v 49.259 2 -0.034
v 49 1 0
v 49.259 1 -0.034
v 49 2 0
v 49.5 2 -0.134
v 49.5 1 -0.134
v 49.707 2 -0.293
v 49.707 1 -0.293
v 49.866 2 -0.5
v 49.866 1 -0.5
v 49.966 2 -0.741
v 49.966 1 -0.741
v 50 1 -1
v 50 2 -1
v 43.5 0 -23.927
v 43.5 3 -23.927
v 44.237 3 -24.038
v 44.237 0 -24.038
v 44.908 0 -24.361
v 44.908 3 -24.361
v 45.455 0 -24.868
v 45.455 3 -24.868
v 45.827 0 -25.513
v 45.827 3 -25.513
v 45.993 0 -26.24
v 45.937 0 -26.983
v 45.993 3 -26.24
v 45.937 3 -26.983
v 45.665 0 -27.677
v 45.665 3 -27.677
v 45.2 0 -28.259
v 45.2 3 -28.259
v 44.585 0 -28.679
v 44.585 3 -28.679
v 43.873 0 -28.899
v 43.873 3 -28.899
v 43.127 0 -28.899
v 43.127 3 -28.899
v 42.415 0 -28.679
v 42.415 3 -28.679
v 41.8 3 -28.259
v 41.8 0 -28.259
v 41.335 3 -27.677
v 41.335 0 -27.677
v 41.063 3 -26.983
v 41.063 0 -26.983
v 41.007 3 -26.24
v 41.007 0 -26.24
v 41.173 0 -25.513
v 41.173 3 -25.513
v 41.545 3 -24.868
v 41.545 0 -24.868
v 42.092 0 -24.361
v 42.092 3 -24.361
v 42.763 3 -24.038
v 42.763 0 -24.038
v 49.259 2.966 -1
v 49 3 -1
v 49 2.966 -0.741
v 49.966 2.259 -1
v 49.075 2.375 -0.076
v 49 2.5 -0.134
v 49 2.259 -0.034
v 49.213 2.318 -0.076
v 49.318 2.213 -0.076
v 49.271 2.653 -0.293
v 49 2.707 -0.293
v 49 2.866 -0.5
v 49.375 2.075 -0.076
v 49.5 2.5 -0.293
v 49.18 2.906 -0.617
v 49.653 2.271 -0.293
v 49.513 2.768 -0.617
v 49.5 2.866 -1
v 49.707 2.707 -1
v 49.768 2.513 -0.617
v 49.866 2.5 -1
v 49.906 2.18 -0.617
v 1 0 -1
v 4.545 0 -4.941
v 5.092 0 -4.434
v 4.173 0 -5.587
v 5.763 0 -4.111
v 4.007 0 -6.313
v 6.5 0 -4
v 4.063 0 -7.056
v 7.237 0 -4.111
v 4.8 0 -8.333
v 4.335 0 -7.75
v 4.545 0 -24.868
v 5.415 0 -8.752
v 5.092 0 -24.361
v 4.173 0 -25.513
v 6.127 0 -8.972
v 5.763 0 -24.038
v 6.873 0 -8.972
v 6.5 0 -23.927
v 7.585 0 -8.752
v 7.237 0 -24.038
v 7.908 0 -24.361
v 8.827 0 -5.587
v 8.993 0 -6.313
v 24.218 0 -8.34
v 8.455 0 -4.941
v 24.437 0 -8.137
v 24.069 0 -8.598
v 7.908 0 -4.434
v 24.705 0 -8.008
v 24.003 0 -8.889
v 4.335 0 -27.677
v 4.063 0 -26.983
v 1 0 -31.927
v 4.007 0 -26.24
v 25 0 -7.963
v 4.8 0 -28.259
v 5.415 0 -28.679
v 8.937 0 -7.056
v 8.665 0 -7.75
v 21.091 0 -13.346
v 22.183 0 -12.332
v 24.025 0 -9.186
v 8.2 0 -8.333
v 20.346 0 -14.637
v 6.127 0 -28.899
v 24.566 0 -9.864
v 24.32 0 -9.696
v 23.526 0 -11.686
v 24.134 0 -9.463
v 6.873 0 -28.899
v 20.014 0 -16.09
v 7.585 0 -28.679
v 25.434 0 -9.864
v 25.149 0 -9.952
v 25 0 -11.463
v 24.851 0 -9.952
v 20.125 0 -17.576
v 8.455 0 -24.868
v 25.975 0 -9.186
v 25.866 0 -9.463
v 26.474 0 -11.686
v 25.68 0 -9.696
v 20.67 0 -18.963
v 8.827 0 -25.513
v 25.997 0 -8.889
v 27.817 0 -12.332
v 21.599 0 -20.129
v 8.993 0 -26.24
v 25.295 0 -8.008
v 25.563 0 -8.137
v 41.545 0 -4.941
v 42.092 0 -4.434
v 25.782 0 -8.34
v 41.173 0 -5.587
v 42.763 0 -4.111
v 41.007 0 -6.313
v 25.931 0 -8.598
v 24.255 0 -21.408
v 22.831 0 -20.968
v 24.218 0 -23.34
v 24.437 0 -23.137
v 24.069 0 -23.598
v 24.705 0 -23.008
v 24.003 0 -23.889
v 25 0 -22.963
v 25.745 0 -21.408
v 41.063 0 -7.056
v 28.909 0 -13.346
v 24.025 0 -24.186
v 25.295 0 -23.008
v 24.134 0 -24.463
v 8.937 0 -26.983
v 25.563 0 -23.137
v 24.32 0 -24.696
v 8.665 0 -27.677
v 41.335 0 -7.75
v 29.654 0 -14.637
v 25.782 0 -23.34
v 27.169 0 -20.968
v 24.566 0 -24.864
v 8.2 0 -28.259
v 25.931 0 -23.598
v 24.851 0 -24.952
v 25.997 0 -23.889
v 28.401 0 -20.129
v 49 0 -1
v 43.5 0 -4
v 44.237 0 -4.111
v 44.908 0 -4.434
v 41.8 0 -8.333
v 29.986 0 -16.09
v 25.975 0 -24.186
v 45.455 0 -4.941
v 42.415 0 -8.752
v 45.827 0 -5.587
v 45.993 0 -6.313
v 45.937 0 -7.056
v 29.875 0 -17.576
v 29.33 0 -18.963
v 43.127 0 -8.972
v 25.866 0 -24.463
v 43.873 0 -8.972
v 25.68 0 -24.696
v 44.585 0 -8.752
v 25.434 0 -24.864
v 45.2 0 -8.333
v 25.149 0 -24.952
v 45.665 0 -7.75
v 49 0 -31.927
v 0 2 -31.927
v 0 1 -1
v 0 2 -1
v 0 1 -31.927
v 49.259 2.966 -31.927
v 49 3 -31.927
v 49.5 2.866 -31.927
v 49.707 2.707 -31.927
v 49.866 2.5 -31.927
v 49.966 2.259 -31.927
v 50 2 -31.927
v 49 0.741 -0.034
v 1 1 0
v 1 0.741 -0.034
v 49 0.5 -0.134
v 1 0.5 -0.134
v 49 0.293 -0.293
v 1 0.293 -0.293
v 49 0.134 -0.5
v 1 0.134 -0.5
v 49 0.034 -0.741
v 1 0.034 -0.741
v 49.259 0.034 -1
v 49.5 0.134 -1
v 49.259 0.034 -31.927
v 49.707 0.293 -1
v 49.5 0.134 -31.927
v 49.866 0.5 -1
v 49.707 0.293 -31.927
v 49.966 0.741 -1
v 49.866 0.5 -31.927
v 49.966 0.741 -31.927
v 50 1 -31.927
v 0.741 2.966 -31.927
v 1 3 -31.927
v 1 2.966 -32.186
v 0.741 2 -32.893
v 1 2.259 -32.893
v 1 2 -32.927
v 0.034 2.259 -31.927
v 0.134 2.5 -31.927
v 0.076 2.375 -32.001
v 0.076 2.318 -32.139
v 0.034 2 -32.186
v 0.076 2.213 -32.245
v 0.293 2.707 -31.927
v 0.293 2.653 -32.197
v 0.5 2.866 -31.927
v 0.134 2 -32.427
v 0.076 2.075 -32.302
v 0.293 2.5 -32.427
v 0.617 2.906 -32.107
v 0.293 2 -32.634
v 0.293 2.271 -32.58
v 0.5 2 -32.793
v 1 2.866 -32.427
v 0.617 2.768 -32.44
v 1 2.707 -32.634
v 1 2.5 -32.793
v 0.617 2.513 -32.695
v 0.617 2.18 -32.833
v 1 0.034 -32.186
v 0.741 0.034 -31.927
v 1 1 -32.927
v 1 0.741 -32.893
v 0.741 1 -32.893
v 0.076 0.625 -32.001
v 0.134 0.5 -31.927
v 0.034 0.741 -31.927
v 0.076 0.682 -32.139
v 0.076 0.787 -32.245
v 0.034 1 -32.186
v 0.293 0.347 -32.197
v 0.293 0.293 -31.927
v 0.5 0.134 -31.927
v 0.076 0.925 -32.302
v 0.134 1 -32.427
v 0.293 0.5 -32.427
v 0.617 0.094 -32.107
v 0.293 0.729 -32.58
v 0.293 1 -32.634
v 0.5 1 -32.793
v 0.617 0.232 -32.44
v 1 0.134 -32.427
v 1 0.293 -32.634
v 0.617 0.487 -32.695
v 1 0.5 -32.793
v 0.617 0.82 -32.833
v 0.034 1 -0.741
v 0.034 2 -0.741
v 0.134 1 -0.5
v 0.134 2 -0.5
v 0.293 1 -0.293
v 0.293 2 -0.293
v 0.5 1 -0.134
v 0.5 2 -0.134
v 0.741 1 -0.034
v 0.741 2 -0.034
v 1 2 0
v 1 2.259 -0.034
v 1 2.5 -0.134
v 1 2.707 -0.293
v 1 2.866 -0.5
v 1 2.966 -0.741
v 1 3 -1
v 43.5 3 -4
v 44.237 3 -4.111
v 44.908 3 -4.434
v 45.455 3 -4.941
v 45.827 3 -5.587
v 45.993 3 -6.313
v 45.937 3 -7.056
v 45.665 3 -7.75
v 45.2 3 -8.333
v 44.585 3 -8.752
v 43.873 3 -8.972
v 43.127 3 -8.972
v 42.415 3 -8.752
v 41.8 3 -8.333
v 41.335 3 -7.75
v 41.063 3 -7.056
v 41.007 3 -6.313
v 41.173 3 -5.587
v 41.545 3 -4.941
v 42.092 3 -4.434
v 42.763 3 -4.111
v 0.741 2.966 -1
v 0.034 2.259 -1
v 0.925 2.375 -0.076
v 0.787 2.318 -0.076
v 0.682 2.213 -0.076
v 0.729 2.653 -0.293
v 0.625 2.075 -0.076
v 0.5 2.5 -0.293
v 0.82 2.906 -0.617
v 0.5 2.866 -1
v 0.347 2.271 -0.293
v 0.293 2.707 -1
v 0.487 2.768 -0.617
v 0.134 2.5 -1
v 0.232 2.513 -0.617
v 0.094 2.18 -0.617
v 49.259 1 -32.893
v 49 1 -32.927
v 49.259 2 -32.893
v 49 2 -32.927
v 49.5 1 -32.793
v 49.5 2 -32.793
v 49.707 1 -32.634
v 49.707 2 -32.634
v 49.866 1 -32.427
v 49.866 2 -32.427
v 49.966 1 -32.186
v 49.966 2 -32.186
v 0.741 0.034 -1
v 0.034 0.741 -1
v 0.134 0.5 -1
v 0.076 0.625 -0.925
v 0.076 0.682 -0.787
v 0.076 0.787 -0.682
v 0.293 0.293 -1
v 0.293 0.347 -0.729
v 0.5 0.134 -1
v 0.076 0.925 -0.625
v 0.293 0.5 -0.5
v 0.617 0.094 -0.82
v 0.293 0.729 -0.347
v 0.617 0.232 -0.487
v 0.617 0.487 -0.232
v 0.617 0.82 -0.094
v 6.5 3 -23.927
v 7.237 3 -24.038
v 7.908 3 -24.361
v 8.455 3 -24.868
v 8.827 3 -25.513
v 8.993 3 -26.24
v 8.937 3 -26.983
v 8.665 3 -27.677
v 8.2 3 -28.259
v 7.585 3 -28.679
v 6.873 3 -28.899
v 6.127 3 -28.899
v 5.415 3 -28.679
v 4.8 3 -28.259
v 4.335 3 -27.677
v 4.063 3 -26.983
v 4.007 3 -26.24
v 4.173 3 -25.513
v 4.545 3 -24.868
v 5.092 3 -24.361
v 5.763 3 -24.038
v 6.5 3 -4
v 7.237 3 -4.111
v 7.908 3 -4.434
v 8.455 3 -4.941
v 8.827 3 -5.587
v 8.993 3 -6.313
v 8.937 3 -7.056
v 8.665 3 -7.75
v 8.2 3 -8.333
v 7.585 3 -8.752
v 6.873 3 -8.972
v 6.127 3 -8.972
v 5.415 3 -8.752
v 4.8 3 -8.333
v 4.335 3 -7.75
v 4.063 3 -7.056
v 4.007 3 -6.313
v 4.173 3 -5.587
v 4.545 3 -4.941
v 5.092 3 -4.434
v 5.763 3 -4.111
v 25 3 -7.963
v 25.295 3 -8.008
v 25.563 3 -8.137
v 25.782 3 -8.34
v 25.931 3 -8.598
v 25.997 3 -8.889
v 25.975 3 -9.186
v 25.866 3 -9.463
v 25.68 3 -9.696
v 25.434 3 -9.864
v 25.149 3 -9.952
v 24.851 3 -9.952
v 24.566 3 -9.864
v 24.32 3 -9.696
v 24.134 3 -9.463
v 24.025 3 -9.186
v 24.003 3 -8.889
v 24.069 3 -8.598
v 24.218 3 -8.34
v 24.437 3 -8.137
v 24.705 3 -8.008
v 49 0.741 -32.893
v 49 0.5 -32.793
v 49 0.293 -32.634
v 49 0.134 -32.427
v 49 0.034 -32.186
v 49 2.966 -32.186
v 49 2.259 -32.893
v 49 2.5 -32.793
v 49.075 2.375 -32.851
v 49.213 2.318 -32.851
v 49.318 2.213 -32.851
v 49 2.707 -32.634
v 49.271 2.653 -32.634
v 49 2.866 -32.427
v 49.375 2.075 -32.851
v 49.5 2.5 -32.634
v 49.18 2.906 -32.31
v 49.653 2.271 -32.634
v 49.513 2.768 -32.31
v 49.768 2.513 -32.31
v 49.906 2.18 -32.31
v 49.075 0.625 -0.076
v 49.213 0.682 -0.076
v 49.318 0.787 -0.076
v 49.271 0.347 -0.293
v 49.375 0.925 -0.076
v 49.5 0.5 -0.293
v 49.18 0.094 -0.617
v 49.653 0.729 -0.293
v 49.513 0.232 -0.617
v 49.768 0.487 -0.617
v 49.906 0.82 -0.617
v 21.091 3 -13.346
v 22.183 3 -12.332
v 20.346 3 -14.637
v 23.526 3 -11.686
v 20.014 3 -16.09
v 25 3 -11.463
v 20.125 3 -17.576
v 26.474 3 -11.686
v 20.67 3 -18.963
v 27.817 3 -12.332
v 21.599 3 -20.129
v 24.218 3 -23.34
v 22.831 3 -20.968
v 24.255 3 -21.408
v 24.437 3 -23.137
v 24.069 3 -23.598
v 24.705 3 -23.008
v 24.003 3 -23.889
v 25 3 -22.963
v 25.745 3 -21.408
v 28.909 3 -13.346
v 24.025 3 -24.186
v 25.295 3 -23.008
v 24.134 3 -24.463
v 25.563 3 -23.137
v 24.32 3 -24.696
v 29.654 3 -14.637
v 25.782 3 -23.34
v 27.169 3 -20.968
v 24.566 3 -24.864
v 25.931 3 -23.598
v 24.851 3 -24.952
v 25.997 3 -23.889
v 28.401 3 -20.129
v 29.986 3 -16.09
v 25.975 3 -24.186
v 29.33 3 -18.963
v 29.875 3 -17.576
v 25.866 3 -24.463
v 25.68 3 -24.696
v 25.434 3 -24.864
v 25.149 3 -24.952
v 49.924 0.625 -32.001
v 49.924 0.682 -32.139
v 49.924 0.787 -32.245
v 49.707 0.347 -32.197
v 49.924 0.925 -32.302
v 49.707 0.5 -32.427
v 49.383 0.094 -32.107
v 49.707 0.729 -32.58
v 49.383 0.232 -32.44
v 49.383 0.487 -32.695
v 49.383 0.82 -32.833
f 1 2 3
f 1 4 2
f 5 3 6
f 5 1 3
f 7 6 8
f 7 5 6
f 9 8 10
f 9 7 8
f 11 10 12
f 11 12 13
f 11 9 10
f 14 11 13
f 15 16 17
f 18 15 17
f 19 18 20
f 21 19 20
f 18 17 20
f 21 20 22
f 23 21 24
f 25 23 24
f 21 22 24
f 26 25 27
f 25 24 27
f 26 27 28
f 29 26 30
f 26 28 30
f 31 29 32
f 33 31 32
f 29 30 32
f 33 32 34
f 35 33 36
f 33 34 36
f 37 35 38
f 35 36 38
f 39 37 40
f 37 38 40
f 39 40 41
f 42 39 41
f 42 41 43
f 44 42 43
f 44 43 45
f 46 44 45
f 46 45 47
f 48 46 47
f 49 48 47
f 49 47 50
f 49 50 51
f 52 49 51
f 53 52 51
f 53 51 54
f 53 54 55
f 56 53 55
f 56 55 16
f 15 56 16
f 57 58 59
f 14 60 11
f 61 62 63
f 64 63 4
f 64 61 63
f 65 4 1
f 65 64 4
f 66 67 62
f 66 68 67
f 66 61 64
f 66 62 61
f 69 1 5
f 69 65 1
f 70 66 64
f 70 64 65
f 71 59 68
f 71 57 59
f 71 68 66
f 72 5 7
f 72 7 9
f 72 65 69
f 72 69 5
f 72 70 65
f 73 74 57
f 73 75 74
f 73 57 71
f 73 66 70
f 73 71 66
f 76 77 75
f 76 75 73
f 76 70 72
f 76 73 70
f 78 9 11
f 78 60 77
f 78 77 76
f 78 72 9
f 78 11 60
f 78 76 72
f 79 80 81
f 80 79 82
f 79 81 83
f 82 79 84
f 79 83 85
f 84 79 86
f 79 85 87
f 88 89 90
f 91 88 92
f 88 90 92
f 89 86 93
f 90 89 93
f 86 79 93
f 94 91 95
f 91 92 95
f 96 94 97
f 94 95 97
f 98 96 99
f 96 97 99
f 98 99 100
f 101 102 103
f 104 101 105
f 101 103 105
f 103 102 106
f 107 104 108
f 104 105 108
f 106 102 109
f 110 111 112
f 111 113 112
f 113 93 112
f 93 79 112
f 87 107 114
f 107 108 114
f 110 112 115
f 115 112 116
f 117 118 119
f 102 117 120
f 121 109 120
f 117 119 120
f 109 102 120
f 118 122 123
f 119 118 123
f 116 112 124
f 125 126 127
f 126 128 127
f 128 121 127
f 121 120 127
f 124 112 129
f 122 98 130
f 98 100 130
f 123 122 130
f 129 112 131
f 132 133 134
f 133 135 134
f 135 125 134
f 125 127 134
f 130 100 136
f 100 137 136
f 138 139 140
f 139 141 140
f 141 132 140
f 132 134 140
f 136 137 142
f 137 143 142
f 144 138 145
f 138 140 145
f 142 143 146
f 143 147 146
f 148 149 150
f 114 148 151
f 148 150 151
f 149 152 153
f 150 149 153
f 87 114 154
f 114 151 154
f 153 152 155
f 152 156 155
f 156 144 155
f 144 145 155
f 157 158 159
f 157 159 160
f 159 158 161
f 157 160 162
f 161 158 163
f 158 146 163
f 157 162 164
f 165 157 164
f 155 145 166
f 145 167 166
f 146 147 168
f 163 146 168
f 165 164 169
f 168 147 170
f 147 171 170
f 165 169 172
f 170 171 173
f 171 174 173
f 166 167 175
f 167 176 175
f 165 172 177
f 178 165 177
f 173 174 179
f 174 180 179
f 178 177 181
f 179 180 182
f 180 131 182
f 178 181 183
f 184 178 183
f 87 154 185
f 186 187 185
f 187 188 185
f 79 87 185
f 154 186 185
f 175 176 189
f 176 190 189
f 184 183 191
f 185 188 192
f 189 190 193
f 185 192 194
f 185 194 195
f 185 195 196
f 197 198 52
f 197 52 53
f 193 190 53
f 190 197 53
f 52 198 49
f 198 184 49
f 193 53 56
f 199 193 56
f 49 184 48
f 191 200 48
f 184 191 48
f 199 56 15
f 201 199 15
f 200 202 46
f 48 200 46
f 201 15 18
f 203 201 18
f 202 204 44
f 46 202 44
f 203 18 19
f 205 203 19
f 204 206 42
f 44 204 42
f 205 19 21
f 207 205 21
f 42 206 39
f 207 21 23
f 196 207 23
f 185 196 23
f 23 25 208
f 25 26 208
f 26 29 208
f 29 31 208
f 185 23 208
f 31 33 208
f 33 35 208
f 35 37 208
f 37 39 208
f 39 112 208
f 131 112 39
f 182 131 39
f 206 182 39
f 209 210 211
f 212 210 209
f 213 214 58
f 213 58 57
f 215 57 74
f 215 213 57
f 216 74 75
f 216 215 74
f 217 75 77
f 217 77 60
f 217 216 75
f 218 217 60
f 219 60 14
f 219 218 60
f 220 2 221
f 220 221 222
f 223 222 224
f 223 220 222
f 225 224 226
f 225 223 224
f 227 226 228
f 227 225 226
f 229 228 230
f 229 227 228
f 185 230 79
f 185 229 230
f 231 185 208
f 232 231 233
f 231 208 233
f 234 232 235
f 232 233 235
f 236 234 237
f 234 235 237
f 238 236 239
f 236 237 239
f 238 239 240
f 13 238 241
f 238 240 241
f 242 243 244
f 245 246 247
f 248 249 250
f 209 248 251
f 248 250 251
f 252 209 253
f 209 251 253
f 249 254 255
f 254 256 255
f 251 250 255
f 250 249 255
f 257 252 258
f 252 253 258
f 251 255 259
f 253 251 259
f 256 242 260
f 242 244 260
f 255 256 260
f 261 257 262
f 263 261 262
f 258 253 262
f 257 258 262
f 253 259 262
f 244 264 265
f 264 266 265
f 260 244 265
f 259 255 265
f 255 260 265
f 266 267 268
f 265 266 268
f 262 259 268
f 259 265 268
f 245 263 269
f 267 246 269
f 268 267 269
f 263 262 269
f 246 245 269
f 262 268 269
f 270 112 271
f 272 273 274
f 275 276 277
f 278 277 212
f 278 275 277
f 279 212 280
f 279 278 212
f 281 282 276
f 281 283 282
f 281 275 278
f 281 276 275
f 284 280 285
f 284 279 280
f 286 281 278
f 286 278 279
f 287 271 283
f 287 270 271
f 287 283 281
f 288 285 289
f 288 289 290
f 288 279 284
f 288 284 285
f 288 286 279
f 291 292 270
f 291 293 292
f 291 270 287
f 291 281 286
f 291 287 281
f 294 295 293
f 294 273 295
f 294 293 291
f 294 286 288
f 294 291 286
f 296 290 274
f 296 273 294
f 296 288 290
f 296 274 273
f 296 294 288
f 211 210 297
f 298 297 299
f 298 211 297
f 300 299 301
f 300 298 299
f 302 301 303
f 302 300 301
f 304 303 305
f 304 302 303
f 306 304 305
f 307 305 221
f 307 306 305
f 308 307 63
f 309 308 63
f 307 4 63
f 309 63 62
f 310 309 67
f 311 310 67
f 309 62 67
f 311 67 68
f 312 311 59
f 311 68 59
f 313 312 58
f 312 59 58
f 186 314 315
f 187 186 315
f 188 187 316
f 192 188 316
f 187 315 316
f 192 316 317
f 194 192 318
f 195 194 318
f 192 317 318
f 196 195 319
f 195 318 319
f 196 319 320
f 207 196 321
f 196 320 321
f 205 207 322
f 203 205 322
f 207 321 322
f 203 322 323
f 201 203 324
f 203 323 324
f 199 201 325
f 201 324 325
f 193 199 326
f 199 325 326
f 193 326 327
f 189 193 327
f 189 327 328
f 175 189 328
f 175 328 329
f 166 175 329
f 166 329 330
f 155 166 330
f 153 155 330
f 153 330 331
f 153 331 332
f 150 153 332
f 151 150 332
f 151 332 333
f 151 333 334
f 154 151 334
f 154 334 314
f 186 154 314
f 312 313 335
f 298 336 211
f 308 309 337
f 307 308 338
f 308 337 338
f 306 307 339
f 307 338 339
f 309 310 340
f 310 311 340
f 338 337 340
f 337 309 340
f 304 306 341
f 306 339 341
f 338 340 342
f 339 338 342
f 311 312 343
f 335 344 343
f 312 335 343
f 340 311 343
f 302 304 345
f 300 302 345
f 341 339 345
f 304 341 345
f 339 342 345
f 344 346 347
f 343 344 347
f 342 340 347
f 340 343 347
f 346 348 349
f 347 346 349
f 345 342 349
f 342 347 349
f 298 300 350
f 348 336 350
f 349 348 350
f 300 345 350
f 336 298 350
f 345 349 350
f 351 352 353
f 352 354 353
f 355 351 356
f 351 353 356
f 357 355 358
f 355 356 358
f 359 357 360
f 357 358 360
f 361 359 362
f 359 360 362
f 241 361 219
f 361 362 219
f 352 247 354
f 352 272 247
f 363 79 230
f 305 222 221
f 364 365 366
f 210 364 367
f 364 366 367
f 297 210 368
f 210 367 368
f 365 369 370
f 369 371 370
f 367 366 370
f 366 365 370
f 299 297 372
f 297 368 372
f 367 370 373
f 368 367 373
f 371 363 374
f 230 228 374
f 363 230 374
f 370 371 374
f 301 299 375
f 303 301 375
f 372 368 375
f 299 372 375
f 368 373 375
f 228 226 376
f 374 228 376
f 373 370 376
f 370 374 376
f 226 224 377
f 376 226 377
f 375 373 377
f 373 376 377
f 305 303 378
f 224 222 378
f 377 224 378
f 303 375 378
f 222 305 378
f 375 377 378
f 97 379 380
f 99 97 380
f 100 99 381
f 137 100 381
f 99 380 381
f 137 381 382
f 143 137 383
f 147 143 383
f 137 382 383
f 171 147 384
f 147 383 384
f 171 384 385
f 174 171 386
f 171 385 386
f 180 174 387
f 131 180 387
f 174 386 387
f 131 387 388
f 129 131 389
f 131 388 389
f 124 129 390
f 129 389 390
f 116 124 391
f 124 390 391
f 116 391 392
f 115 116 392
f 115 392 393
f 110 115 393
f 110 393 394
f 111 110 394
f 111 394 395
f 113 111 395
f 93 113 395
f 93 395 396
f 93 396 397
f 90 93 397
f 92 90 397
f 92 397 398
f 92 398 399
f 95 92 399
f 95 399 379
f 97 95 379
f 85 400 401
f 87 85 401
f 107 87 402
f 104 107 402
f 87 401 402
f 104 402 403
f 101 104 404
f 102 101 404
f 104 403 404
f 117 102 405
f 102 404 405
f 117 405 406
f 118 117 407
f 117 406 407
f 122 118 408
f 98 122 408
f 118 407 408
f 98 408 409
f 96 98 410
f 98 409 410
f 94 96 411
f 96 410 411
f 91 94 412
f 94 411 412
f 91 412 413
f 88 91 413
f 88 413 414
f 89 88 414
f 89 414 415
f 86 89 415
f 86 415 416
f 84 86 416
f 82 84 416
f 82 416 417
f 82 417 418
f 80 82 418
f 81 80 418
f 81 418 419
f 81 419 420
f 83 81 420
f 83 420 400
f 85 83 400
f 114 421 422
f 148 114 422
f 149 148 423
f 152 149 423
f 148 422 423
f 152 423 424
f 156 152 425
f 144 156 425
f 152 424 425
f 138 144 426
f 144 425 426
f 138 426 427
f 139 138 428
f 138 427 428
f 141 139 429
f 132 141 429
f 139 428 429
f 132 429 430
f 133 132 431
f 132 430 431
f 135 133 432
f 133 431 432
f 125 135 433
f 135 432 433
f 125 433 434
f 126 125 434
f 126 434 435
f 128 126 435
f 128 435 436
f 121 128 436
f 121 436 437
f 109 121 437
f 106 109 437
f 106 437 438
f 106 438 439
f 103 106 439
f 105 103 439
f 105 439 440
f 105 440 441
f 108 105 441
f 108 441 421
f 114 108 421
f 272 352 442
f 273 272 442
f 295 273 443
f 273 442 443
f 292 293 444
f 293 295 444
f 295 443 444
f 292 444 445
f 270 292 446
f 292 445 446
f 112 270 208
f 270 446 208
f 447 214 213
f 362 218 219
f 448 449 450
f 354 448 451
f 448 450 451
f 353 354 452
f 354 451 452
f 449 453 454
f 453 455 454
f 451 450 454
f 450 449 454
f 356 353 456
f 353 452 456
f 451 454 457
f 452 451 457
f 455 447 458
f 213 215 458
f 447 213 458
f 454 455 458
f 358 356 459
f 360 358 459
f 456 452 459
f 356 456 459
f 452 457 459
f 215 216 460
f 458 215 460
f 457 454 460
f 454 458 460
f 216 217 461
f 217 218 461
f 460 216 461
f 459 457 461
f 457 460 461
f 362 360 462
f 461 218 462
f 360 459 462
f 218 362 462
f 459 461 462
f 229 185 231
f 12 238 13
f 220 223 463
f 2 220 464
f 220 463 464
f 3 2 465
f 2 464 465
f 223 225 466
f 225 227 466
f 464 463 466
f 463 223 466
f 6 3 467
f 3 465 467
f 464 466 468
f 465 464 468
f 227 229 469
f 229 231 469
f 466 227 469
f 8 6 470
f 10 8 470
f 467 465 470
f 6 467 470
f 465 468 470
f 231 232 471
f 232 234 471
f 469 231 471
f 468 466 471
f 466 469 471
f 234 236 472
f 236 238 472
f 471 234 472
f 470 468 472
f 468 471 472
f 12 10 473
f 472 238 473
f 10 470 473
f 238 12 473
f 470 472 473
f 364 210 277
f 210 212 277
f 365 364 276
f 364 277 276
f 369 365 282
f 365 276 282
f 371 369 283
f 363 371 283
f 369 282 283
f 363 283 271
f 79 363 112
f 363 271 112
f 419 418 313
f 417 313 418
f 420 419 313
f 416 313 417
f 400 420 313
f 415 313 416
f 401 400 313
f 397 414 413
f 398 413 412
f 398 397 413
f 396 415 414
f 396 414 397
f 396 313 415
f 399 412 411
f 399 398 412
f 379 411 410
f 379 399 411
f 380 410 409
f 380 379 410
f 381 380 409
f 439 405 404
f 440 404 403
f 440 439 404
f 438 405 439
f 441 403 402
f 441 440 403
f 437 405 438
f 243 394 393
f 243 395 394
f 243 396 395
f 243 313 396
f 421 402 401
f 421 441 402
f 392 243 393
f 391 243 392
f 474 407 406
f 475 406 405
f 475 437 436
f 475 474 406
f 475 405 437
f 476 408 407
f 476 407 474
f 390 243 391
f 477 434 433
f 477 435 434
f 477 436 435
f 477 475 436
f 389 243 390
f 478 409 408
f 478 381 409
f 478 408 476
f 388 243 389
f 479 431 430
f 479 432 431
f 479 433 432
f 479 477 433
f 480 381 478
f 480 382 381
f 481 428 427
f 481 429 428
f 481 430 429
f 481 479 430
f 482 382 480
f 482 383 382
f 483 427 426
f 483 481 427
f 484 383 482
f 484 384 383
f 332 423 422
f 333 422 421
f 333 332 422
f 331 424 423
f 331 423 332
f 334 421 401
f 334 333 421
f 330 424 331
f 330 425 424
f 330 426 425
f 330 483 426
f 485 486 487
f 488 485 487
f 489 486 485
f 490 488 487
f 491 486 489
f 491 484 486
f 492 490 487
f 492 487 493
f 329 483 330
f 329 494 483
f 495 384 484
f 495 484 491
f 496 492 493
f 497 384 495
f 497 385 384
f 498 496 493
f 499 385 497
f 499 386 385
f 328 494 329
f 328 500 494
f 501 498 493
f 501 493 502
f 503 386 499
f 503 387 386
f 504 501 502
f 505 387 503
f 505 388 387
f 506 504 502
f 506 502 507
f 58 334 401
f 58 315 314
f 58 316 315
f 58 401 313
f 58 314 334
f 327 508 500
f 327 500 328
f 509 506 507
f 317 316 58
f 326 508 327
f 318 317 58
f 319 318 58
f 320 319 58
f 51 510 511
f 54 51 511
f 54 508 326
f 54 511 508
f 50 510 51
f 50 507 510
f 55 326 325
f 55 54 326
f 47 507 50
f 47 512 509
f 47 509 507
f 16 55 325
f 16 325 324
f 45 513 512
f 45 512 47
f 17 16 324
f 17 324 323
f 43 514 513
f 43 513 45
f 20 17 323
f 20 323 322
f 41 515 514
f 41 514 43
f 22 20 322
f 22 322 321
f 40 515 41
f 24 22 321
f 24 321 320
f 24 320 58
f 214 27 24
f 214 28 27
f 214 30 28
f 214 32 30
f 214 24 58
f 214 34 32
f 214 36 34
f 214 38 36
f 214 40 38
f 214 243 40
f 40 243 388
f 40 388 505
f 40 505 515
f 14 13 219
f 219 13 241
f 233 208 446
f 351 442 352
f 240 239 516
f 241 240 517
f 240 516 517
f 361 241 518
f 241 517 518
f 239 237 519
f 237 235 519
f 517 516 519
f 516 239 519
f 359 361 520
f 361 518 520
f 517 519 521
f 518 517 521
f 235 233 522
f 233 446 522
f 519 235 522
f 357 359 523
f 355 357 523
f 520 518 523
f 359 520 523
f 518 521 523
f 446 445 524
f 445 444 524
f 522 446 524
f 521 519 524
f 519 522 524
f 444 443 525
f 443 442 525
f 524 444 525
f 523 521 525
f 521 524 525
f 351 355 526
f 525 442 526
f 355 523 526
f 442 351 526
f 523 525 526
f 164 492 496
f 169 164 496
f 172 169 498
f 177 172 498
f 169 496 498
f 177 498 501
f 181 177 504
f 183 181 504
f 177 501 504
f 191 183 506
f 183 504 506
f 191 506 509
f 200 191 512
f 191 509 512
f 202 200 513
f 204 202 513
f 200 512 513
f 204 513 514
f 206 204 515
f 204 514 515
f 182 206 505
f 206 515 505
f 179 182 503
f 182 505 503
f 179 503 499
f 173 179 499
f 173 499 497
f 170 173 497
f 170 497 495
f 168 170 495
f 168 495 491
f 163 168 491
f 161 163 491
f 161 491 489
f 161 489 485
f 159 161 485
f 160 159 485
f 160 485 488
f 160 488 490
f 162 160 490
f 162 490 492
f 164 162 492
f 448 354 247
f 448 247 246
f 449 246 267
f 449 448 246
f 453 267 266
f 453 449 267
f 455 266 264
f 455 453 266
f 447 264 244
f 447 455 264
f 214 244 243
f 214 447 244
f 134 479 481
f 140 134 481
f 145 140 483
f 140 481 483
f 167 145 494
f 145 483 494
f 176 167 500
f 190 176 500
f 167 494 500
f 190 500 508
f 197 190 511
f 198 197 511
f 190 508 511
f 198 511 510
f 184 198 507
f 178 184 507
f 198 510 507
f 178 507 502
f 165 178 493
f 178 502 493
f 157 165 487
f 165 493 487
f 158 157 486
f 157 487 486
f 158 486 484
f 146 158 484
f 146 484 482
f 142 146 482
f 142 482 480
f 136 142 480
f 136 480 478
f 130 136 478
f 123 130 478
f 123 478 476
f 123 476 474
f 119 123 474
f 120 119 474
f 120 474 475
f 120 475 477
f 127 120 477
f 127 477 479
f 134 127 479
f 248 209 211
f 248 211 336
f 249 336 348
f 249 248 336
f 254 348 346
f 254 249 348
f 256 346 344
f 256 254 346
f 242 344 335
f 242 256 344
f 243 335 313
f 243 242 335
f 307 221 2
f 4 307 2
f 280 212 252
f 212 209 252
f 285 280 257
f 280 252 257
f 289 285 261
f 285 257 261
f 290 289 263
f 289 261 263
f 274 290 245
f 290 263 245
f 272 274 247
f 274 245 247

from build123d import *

# Parameters (mm, degrees)
SKETCH1_W           = 50
SKETCH1_H           = 32.926829268
BOSS_EXTRUDE1_DEPTH = 3
CUT_EXTRUDE1_REACH  = 61.943
SKETCH2_R           = 1
SKETCH2_R_2         = 5
CUT_EXTRUDE2_REACH  = 61.943
SKETCH3_R           = 2.5
FILLET1_R           = 1


with BuildPart() as part:
    # Sketch1 → Boss-Extrude1 (new body)
    with BuildSketch(Plane(origin=(0, 0, 0), x_dir=(1, 0, 0), z_dir=(0, 1, 0))):
        with Locations((25, 16.463414634)):
            Rectangle(SKETCH1_W, SKETCH1_H)
    extrude(amount=BOSS_EXTRUDE1_DEPTH)

    # Sketch2 → Cut-Extrude1 (cut, up to next)
    with BuildSketch(Plane(origin=(0, 3, 0), x_dir=(1, 0, 0), z_dir=(0, 1, 0)), mode=Mode.PRIVATE) as cut_extrude1_sk1:
        with Locations(Location((25, 8.963414634, 0), (0, 0, 270))):
            Circle(SKETCH2_R)
    cut_extrude1_tool1 = extrude(cut_extrude1_sk1.sketch, amount=-CUT_EXTRUDE1_REACH, mode=Mode.PRIVATE) & part.part
    # Sketch2 → Cut-Extrude1 (cut, up to next)
    with BuildSketch(Plane(origin=(0, 3, 0), x_dir=(1, 0, 0), z_dir=(0, 1, 0)), mode=Mode.PRIVATE) as cut_extrude1_sk2:
        with Locations(Location((25, 16.463414634, 0), (0, 0, 270))):
            Circle(SKETCH2_R_2)
    cut_extrude1_tool2 = extrude(cut_extrude1_sk2.sketch, amount=-CUT_EXTRUDE1_REACH, mode=Mode.PRIVATE) & part.part
    # Sketch2 → Cut-Extrude1 (cut, up to next)
    with BuildSketch(Plane(origin=(0, 3, 0), x_dir=(1, 0, 0), z_dir=(0, 1, 0)), mode=Mode.PRIVATE) as cut_extrude1_sk3:
        with Locations(Location((25, 23.963414634, 0), (0, 0, 270))):
            Circle(SKETCH2_R)
    cut_extrude1_tool3 = extrude(cut_extrude1_sk3.sketch, amount=-CUT_EXTRUDE1_REACH, mode=Mode.PRIVATE) & part.part
    add(cut_extrude1_tool1.solids().sort_by_distance((25, 3, -8.963415))[0], mode=Mode.SUBTRACT)
    add(cut_extrude1_tool2.solids().sort_by_distance((25, 3, -16.463415))[0], mode=Mode.SUBTRACT)
    add(cut_extrude1_tool3.solids().sort_by_distance((25, 3, -23.963415))[0], mode=Mode.SUBTRACT)

    # Sketch3 → Cut-Extrude2 (cut, up to next)
    with BuildSketch(Plane(origin=(0, 3, 0), x_dir=(1, 0, 0), z_dir=(0, 1, 0)), mode=Mode.PRIVATE) as cut_extrude2_sk1:
        with Locations(Location((43.5, 6.5, 0), (0, 0, 270))):
            Circle(SKETCH3_R)
    cut_extrude2_tool1 = extrude(cut_extrude2_sk1.sketch, amount=-CUT_EXTRUDE2_REACH, mode=Mode.PRIVATE) & part.part
    # Sketch3 → Cut-Extrude2 (cut, up to next)
    with BuildSketch(Plane(origin=(0, 3, 0), x_dir=(1, 0, 0), z_dir=(0, 1, 0)), mode=Mode.PRIVATE) as cut_extrude2_sk2:
        with Locations(Location((43.5, 26.426829268, 0), (0, 0, 270))):
            Circle(SKETCH3_R)
    cut_extrude2_tool2 = extrude(cut_extrude2_sk2.sketch, amount=-CUT_EXTRUDE2_REACH, mode=Mode.PRIVATE) & part.part
    # Sketch3 → Cut-Extrude2 (cut, up to next)
    with BuildSketch(Plane(origin=(0, 3, 0), x_dir=(1, 0, 0), z_dir=(0, 1, 0)), mode=Mode.PRIVATE) as cut_extrude2_sk3:
        with Locations(Location((6.5, 26.426829268, 0), (0, 0, 270))):
            Circle(SKETCH3_R)
    cut_extrude2_tool3 = extrude(cut_extrude2_sk3.sketch, amount=-CUT_EXTRUDE2_REACH, mode=Mode.PRIVATE) & part.part
    # Sketch3 → Cut-Extrude2 (cut, up to next)
    with BuildSketch(Plane(origin=(0, 3, 0), x_dir=(1, 0, 0), z_dir=(0, 1, 0)), mode=Mode.PRIVATE) as cut_extrude2_sk4:
        with Locations(Location((6.5, 6.5, 0), (0, 0, 270))):
            Circle(SKETCH3_R)
    cut_extrude2_tool4 = extrude(cut_extrude2_sk4.sketch, amount=-CUT_EXTRUDE2_REACH, mode=Mode.PRIVATE) & part.part
    add(cut_extrude2_tool1.solids().sort_by_distance((43.5, 3, -6.5))[0], mode=Mode.SUBTRACT)
    add(cut_extrude2_tool2.solids().sort_by_distance((43.5, 3, -26.426829))[0], mode=Mode.SUBTRACT)
    add(cut_extrude2_tool3.solids().sort_by_distance((6.5, 3, -26.426829))[0], mode=Mode.SUBTRACT)
    add(cut_extrude2_tool4.solids().sort_by_distance((6.5, 3, -6.5))[0], mode=Mode.SUBTRACT)

    # Fillet1
    fillet1_edges = [part.edges().sort_by_distance(p)[0] for p in [
        (50, 3, -16.463414634),
        (25, 3, -32.926829268),
        (0, 3, -16.463414634),
        (25, 0, -32.926829268),
        (50, 0, -16.463414634),
        (25, 0, 0),
        (0, 0, -16.463414634),
        (25, 3, 0),
        (0, 1.5, -32.926829268),
        (50, 1.5, -32.926829268),
        (50, 1.5, 0),
        (0, 1.5, 0),
    ]]
    fillet(fillet1_edges, radius=FILLET1_R)


solid = part.part
